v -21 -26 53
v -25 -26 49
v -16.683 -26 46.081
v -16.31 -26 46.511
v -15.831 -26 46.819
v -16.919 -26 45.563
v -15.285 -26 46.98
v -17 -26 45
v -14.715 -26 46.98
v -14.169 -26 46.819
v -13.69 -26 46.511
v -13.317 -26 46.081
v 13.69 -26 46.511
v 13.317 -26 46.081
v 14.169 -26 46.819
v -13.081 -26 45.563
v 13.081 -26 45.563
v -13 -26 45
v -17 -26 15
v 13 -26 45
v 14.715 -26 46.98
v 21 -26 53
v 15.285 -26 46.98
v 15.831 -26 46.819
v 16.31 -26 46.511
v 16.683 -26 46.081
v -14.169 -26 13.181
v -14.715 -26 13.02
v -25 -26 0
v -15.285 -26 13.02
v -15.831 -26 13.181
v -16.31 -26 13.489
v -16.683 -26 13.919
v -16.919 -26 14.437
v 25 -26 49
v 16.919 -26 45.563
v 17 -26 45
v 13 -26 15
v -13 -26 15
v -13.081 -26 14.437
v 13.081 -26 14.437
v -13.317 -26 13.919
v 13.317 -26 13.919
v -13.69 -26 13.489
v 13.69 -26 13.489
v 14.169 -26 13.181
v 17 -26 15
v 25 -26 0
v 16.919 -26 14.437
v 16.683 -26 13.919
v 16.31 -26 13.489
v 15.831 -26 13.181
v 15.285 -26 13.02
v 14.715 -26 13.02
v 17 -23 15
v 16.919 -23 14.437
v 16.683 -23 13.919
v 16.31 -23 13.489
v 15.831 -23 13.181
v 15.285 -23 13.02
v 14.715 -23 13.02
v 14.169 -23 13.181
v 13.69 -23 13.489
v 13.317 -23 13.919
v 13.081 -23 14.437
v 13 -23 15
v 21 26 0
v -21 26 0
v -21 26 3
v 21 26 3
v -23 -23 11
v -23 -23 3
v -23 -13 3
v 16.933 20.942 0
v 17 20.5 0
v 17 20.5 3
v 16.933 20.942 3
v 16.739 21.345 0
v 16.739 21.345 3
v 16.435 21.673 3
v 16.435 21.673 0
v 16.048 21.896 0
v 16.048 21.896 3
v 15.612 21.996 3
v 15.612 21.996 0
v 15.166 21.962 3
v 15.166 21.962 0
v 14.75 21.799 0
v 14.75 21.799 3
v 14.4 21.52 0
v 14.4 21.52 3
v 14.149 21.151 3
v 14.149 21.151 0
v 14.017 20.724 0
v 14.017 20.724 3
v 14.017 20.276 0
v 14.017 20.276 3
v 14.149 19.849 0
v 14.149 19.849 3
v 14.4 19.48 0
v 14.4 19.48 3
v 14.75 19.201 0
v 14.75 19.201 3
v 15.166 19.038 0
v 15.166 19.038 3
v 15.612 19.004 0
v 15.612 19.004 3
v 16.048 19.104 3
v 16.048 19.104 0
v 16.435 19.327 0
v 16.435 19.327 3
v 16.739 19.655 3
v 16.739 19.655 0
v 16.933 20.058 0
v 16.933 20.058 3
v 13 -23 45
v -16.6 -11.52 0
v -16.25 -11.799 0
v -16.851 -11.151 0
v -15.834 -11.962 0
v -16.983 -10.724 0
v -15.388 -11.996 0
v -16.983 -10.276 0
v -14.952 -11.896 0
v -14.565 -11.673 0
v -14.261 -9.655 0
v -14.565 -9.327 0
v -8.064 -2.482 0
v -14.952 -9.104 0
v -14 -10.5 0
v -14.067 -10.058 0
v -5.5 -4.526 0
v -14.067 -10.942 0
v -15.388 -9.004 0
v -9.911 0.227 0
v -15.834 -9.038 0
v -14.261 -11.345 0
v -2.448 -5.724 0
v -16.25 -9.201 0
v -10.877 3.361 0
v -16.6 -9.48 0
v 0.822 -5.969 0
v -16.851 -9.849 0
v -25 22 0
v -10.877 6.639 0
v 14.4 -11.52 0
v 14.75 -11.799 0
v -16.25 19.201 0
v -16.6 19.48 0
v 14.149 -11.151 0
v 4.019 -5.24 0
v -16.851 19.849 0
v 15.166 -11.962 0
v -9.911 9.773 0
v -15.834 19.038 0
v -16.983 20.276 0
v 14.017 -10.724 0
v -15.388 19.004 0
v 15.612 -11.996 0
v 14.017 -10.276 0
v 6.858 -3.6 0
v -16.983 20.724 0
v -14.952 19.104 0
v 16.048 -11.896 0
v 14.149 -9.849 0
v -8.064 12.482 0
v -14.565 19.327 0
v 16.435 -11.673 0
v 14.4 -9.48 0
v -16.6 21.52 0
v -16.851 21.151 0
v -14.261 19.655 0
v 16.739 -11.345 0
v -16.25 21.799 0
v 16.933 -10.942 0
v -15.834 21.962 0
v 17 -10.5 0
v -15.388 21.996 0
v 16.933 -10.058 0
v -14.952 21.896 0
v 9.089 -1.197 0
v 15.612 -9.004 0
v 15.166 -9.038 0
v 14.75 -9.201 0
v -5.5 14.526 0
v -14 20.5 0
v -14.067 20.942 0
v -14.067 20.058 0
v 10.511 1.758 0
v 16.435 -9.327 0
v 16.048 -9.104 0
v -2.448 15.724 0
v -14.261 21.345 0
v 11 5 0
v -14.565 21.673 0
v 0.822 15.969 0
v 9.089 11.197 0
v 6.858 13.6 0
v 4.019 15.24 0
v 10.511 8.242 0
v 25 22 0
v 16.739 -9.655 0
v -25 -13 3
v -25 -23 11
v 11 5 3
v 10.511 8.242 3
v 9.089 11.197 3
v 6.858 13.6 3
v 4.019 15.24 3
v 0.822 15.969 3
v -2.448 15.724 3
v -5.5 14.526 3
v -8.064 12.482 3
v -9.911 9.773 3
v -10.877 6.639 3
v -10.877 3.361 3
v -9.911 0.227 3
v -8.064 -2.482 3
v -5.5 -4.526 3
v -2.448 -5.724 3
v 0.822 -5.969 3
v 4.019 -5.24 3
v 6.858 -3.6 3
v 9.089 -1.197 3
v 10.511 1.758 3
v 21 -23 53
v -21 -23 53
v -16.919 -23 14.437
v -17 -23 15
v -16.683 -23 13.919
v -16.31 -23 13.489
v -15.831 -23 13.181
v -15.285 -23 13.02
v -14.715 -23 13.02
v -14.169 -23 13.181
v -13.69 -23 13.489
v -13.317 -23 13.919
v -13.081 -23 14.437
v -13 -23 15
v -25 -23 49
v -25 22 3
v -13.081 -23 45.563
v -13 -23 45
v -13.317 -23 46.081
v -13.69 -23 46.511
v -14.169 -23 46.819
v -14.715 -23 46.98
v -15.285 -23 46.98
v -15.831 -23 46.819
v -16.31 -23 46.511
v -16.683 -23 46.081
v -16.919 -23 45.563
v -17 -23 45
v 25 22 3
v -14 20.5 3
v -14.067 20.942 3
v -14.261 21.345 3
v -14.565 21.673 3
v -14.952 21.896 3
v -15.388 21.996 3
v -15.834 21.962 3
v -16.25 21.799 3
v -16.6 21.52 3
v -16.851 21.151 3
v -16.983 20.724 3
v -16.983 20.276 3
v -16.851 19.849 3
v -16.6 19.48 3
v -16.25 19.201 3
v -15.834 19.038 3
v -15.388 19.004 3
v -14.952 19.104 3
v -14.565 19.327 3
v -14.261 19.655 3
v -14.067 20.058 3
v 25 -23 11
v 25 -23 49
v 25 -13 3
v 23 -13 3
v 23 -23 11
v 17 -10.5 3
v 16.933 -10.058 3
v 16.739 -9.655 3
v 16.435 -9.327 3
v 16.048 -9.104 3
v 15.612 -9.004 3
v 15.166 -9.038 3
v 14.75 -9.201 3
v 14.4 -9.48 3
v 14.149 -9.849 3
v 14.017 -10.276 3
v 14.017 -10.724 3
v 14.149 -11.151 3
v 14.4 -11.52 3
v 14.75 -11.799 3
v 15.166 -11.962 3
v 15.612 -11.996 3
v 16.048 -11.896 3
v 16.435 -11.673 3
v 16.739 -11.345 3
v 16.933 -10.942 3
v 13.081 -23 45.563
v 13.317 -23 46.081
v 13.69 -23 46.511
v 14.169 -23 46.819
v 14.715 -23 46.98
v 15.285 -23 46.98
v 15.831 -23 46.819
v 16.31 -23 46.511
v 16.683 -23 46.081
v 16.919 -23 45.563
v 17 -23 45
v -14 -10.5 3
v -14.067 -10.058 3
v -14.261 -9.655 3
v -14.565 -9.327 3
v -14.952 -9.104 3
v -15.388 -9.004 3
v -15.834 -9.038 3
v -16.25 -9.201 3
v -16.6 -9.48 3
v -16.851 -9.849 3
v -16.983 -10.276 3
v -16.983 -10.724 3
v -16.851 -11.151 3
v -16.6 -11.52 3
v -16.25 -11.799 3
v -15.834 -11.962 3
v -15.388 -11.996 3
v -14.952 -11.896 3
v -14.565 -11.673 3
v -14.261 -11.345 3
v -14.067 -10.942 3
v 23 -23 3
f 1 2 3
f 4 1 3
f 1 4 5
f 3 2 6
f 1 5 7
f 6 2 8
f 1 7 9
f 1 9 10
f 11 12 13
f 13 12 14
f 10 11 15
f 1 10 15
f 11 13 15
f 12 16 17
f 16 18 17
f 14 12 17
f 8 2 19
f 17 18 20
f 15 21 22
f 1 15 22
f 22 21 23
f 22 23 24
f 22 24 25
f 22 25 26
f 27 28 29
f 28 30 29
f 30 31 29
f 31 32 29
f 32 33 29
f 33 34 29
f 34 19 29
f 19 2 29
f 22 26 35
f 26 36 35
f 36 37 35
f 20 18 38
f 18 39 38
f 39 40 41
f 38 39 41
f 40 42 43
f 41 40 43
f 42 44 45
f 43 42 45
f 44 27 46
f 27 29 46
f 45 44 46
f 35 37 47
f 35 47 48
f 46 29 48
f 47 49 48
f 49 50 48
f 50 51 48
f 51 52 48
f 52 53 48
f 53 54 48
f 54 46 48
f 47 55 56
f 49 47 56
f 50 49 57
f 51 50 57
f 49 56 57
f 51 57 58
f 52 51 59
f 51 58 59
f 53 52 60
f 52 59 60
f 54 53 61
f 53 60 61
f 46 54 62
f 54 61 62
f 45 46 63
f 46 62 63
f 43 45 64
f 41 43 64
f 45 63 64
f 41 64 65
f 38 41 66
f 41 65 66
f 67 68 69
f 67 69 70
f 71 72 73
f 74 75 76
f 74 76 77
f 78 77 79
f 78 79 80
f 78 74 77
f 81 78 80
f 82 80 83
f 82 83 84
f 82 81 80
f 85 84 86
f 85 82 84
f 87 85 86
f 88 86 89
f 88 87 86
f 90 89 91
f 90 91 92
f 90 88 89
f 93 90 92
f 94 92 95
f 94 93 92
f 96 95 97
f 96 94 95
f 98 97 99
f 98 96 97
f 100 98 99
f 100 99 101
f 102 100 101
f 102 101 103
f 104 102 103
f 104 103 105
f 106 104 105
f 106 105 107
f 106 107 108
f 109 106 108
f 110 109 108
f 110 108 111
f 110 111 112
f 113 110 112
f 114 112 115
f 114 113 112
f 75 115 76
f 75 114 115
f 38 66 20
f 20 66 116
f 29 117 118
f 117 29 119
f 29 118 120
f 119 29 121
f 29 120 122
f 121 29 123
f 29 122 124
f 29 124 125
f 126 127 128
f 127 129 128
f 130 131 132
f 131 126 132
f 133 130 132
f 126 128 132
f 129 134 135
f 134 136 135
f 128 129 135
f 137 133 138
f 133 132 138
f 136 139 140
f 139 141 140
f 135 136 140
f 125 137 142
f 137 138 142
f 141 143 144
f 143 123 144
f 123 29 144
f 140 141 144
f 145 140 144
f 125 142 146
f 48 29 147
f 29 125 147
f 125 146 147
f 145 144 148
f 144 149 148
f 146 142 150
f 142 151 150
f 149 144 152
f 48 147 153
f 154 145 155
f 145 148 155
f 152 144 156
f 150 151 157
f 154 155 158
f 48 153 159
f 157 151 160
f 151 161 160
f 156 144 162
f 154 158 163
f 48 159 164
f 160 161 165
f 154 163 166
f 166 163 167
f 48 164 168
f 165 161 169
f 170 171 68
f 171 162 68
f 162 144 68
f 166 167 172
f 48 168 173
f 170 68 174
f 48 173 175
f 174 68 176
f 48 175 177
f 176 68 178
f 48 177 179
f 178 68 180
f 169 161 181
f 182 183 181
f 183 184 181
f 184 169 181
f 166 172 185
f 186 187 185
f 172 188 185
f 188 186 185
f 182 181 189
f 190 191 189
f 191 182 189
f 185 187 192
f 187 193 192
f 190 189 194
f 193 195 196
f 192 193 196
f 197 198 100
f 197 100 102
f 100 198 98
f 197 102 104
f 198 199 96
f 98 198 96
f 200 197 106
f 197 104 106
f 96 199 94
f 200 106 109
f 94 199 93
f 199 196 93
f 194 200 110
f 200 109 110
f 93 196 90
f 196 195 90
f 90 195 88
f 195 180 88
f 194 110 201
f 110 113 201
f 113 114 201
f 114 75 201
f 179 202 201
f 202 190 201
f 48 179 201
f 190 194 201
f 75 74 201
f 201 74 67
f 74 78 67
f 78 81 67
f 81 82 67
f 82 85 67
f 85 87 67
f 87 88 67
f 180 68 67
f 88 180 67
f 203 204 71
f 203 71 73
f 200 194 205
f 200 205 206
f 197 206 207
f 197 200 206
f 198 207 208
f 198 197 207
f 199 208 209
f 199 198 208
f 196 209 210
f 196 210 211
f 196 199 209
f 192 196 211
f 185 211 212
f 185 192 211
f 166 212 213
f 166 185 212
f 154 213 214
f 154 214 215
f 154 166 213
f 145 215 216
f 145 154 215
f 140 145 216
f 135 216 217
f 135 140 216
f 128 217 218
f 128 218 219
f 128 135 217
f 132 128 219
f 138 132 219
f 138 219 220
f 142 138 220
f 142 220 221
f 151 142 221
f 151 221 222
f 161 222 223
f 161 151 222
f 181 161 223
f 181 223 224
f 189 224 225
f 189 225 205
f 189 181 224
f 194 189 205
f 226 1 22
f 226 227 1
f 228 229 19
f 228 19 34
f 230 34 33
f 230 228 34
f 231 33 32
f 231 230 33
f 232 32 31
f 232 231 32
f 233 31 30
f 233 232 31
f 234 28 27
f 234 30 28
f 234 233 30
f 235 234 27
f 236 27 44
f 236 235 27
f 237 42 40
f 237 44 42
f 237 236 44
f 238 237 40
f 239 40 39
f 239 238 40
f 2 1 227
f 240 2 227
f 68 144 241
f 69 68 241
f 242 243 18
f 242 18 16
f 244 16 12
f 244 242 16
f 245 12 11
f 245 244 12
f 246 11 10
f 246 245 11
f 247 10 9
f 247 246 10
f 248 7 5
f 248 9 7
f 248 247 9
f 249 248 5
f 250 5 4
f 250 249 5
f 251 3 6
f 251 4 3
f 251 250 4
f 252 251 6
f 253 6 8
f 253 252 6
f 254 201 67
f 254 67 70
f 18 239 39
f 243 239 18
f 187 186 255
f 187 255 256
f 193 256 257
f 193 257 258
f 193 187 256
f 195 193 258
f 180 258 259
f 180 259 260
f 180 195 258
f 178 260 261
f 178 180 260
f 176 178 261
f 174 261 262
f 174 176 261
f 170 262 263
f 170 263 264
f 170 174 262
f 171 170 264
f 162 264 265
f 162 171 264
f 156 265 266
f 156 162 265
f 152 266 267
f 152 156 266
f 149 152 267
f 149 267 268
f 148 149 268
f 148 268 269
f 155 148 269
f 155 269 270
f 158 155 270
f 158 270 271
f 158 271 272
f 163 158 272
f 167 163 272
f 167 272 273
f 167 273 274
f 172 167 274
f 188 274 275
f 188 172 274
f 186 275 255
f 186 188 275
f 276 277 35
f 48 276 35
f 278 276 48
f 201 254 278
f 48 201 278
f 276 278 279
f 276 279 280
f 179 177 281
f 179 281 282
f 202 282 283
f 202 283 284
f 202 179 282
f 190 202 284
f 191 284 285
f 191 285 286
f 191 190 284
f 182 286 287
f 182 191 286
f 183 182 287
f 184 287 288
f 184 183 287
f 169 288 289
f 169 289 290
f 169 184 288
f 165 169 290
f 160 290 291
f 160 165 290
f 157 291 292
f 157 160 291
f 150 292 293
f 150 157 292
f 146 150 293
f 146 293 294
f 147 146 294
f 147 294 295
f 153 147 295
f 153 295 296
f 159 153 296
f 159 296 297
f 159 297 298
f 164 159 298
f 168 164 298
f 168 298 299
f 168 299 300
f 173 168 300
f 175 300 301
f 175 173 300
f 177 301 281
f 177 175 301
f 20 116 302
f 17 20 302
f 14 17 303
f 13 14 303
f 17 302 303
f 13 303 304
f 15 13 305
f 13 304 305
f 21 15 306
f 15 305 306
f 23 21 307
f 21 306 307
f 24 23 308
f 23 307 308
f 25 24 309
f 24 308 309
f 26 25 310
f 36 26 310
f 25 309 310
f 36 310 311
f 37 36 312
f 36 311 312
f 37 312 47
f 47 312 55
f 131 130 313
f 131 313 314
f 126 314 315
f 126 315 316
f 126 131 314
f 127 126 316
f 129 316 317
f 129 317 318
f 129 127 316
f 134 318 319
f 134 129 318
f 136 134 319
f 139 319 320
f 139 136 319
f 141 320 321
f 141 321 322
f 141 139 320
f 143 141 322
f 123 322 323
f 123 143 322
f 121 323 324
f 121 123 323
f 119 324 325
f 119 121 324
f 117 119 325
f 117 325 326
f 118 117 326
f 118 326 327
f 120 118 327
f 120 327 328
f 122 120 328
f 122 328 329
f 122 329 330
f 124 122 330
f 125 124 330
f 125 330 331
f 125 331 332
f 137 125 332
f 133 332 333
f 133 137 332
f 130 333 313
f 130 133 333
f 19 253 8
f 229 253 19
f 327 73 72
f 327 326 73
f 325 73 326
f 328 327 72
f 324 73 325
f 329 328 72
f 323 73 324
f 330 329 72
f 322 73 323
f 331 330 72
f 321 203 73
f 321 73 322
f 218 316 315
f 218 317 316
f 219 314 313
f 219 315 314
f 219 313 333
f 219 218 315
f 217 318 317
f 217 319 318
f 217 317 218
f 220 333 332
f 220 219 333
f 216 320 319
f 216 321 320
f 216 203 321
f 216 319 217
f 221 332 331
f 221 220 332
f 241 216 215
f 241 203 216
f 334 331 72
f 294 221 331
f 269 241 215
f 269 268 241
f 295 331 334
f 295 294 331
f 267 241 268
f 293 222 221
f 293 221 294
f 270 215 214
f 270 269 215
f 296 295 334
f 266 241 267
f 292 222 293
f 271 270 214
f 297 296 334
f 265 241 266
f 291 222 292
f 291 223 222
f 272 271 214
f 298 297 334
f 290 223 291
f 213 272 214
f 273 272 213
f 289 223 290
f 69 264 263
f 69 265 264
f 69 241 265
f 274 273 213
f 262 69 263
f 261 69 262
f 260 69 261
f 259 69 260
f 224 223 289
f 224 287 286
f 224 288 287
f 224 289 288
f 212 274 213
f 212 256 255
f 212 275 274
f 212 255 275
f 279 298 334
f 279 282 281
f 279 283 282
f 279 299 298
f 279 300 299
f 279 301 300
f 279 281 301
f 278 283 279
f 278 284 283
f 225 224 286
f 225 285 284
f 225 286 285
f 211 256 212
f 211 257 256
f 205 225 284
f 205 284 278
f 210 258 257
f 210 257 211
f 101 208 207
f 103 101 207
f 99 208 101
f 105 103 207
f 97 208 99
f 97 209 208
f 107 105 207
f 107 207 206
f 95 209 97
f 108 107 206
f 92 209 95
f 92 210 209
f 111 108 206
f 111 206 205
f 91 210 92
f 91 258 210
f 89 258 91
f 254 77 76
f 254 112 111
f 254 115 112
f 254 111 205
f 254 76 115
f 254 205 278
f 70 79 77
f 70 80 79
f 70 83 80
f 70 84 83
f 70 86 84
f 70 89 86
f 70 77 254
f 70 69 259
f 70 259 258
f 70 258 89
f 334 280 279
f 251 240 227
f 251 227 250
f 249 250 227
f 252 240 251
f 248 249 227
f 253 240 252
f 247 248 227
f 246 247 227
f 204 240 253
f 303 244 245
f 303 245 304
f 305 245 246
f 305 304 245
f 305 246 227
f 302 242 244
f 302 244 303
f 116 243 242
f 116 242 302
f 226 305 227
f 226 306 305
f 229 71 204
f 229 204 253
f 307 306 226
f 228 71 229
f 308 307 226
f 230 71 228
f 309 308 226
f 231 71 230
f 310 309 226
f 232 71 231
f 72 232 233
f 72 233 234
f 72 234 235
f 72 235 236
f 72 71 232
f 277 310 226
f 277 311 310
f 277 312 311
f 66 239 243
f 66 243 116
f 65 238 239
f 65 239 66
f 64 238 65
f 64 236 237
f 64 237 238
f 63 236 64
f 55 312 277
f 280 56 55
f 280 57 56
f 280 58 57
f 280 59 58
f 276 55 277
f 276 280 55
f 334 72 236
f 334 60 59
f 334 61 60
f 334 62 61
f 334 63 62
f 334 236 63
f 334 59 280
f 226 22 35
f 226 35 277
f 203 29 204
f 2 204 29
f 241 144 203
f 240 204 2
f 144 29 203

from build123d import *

# Parameters (mm, degrees)
SKETCH1_W           = 50
SKETCH1_H           = 52
SKETCH1_R           = 11
SKETCH1_R_2         = 1.5
BOSS_EXTRUDE1_DEPTH = 3
CHAMFER1_SIZE       = 4
SKETCH2_W           = 50
SKETCH2_H           = 3
BOSS_EXTRUDE2_DEPTH = 50
BOSS_EXTRUDE3_DEPTH = 2
BOSS_EXTRUDE4_DEPTH = 2
CHAMFER2_SIZE       = 4
CUT_EXTRUDE1_DEPTH  = 4


with BuildPart() as part:
    # Sketch1 → Boss-Extrude1 (new body)
    with BuildSketch(Plane.XY):
        Rectangle(SKETCH1_W, SKETCH1_H)
        with Locations((0, 5)):
            Circle(SKETCH1_R, mode=Mode.SUBTRACT)
        with Locations((-15.5, 20.5)):
            Circle(SKETCH1_R_2, mode=Mode.SUBTRACT)
        with Locations((15.5, 20.5)):
            Circle(SKETCH1_R_2, mode=Mode.SUBTRACT)
        with Locations((15.5, -10.5)):
            Circle(SKETCH1_R_2, mode=Mode.SUBTRACT)
        with Locations((-15.5, -10.5)):
            Circle(SKETCH1_R_2, mode=Mode.SUBTRACT)
    extrude(amount=BOSS_EXTRUDE1_DEPTH)

    # Chamfer1
    chamfer1_edges = [part.edges().sort_by_distance(p)[0] for p in [
        (-25, 26, 1.5),
        (25, 26, 1.5),
    ]]
    chamfer(chamfer1_edges, length=CHAMFER1_SIZE)

    # Sketch2 → Boss-Extrude2 (add)
    with BuildSketch(Plane.XY.offset(3)):
        with Locations((0, -24.5)):
            Rectangle(SKETCH2_W, SKETCH2_H)
    extrude(amount=BOSS_EXTRUDE2_DEPTH)

    # Sketch3 → Boss-Extrude3 (add)
    with BuildSketch(Plane(origin=(25, 0, 0), x_dir=(0, 0, -1), z_dir=(1, 0, 0))):
        Polygon((-3, -13), (-11, -23), (-3, -23), align=None)
    extrude(amount=-BOSS_EXTRUDE3_DEPTH)

    # Sketch4 → Boss-Extrude4 (add)
    with BuildSketch(Plane.ZY.offset(25)):
        Polygon((3, -13), (3, -23), (11, -23), align=None)
    extrude(amount=-BOSS_EXTRUDE4_DEPTH)

    # Chamfer2
    chamfer2_edges = [part.edges().sort_by_distance(p)[0] for p in [
        (-25, -24.5, 53),
        (25, -24.5, 53),
    ]]
    chamfer(chamfer2_edges, length=CHAMFER2_SIZE)

    # Sketch5 → Cut-Extrude1 (cut, through all)
    with BuildSketch(Plane(origin=(0, -23, 0), x_dir=(1, 0, 0), z_dir=(0, 1, 0))):
        with BuildLine():
            Line((-13, -15), (-13, -45))
            ThreePointArc((-13, -45), (-15, -47), (-17, -45))
            Line((-17, -45), (-17, -15))
            ThreePointArc((-17, -15), (-15, -13), (-13, -15))
        make_face()
        with BuildLine():
            Line((13, -15), (13, -45))
            ThreePointArc((13, -45), (15, -47), (17, -45))
            Line((17, -45), (17, -15))
            ThreePointArc((17, -15), (15, -13), (13, -15))
        make_face()
    extrude(amount=-CUT_EXTRUDE1_DEPTH, mode=Mode.SUBTRACT)


solid = part.part
